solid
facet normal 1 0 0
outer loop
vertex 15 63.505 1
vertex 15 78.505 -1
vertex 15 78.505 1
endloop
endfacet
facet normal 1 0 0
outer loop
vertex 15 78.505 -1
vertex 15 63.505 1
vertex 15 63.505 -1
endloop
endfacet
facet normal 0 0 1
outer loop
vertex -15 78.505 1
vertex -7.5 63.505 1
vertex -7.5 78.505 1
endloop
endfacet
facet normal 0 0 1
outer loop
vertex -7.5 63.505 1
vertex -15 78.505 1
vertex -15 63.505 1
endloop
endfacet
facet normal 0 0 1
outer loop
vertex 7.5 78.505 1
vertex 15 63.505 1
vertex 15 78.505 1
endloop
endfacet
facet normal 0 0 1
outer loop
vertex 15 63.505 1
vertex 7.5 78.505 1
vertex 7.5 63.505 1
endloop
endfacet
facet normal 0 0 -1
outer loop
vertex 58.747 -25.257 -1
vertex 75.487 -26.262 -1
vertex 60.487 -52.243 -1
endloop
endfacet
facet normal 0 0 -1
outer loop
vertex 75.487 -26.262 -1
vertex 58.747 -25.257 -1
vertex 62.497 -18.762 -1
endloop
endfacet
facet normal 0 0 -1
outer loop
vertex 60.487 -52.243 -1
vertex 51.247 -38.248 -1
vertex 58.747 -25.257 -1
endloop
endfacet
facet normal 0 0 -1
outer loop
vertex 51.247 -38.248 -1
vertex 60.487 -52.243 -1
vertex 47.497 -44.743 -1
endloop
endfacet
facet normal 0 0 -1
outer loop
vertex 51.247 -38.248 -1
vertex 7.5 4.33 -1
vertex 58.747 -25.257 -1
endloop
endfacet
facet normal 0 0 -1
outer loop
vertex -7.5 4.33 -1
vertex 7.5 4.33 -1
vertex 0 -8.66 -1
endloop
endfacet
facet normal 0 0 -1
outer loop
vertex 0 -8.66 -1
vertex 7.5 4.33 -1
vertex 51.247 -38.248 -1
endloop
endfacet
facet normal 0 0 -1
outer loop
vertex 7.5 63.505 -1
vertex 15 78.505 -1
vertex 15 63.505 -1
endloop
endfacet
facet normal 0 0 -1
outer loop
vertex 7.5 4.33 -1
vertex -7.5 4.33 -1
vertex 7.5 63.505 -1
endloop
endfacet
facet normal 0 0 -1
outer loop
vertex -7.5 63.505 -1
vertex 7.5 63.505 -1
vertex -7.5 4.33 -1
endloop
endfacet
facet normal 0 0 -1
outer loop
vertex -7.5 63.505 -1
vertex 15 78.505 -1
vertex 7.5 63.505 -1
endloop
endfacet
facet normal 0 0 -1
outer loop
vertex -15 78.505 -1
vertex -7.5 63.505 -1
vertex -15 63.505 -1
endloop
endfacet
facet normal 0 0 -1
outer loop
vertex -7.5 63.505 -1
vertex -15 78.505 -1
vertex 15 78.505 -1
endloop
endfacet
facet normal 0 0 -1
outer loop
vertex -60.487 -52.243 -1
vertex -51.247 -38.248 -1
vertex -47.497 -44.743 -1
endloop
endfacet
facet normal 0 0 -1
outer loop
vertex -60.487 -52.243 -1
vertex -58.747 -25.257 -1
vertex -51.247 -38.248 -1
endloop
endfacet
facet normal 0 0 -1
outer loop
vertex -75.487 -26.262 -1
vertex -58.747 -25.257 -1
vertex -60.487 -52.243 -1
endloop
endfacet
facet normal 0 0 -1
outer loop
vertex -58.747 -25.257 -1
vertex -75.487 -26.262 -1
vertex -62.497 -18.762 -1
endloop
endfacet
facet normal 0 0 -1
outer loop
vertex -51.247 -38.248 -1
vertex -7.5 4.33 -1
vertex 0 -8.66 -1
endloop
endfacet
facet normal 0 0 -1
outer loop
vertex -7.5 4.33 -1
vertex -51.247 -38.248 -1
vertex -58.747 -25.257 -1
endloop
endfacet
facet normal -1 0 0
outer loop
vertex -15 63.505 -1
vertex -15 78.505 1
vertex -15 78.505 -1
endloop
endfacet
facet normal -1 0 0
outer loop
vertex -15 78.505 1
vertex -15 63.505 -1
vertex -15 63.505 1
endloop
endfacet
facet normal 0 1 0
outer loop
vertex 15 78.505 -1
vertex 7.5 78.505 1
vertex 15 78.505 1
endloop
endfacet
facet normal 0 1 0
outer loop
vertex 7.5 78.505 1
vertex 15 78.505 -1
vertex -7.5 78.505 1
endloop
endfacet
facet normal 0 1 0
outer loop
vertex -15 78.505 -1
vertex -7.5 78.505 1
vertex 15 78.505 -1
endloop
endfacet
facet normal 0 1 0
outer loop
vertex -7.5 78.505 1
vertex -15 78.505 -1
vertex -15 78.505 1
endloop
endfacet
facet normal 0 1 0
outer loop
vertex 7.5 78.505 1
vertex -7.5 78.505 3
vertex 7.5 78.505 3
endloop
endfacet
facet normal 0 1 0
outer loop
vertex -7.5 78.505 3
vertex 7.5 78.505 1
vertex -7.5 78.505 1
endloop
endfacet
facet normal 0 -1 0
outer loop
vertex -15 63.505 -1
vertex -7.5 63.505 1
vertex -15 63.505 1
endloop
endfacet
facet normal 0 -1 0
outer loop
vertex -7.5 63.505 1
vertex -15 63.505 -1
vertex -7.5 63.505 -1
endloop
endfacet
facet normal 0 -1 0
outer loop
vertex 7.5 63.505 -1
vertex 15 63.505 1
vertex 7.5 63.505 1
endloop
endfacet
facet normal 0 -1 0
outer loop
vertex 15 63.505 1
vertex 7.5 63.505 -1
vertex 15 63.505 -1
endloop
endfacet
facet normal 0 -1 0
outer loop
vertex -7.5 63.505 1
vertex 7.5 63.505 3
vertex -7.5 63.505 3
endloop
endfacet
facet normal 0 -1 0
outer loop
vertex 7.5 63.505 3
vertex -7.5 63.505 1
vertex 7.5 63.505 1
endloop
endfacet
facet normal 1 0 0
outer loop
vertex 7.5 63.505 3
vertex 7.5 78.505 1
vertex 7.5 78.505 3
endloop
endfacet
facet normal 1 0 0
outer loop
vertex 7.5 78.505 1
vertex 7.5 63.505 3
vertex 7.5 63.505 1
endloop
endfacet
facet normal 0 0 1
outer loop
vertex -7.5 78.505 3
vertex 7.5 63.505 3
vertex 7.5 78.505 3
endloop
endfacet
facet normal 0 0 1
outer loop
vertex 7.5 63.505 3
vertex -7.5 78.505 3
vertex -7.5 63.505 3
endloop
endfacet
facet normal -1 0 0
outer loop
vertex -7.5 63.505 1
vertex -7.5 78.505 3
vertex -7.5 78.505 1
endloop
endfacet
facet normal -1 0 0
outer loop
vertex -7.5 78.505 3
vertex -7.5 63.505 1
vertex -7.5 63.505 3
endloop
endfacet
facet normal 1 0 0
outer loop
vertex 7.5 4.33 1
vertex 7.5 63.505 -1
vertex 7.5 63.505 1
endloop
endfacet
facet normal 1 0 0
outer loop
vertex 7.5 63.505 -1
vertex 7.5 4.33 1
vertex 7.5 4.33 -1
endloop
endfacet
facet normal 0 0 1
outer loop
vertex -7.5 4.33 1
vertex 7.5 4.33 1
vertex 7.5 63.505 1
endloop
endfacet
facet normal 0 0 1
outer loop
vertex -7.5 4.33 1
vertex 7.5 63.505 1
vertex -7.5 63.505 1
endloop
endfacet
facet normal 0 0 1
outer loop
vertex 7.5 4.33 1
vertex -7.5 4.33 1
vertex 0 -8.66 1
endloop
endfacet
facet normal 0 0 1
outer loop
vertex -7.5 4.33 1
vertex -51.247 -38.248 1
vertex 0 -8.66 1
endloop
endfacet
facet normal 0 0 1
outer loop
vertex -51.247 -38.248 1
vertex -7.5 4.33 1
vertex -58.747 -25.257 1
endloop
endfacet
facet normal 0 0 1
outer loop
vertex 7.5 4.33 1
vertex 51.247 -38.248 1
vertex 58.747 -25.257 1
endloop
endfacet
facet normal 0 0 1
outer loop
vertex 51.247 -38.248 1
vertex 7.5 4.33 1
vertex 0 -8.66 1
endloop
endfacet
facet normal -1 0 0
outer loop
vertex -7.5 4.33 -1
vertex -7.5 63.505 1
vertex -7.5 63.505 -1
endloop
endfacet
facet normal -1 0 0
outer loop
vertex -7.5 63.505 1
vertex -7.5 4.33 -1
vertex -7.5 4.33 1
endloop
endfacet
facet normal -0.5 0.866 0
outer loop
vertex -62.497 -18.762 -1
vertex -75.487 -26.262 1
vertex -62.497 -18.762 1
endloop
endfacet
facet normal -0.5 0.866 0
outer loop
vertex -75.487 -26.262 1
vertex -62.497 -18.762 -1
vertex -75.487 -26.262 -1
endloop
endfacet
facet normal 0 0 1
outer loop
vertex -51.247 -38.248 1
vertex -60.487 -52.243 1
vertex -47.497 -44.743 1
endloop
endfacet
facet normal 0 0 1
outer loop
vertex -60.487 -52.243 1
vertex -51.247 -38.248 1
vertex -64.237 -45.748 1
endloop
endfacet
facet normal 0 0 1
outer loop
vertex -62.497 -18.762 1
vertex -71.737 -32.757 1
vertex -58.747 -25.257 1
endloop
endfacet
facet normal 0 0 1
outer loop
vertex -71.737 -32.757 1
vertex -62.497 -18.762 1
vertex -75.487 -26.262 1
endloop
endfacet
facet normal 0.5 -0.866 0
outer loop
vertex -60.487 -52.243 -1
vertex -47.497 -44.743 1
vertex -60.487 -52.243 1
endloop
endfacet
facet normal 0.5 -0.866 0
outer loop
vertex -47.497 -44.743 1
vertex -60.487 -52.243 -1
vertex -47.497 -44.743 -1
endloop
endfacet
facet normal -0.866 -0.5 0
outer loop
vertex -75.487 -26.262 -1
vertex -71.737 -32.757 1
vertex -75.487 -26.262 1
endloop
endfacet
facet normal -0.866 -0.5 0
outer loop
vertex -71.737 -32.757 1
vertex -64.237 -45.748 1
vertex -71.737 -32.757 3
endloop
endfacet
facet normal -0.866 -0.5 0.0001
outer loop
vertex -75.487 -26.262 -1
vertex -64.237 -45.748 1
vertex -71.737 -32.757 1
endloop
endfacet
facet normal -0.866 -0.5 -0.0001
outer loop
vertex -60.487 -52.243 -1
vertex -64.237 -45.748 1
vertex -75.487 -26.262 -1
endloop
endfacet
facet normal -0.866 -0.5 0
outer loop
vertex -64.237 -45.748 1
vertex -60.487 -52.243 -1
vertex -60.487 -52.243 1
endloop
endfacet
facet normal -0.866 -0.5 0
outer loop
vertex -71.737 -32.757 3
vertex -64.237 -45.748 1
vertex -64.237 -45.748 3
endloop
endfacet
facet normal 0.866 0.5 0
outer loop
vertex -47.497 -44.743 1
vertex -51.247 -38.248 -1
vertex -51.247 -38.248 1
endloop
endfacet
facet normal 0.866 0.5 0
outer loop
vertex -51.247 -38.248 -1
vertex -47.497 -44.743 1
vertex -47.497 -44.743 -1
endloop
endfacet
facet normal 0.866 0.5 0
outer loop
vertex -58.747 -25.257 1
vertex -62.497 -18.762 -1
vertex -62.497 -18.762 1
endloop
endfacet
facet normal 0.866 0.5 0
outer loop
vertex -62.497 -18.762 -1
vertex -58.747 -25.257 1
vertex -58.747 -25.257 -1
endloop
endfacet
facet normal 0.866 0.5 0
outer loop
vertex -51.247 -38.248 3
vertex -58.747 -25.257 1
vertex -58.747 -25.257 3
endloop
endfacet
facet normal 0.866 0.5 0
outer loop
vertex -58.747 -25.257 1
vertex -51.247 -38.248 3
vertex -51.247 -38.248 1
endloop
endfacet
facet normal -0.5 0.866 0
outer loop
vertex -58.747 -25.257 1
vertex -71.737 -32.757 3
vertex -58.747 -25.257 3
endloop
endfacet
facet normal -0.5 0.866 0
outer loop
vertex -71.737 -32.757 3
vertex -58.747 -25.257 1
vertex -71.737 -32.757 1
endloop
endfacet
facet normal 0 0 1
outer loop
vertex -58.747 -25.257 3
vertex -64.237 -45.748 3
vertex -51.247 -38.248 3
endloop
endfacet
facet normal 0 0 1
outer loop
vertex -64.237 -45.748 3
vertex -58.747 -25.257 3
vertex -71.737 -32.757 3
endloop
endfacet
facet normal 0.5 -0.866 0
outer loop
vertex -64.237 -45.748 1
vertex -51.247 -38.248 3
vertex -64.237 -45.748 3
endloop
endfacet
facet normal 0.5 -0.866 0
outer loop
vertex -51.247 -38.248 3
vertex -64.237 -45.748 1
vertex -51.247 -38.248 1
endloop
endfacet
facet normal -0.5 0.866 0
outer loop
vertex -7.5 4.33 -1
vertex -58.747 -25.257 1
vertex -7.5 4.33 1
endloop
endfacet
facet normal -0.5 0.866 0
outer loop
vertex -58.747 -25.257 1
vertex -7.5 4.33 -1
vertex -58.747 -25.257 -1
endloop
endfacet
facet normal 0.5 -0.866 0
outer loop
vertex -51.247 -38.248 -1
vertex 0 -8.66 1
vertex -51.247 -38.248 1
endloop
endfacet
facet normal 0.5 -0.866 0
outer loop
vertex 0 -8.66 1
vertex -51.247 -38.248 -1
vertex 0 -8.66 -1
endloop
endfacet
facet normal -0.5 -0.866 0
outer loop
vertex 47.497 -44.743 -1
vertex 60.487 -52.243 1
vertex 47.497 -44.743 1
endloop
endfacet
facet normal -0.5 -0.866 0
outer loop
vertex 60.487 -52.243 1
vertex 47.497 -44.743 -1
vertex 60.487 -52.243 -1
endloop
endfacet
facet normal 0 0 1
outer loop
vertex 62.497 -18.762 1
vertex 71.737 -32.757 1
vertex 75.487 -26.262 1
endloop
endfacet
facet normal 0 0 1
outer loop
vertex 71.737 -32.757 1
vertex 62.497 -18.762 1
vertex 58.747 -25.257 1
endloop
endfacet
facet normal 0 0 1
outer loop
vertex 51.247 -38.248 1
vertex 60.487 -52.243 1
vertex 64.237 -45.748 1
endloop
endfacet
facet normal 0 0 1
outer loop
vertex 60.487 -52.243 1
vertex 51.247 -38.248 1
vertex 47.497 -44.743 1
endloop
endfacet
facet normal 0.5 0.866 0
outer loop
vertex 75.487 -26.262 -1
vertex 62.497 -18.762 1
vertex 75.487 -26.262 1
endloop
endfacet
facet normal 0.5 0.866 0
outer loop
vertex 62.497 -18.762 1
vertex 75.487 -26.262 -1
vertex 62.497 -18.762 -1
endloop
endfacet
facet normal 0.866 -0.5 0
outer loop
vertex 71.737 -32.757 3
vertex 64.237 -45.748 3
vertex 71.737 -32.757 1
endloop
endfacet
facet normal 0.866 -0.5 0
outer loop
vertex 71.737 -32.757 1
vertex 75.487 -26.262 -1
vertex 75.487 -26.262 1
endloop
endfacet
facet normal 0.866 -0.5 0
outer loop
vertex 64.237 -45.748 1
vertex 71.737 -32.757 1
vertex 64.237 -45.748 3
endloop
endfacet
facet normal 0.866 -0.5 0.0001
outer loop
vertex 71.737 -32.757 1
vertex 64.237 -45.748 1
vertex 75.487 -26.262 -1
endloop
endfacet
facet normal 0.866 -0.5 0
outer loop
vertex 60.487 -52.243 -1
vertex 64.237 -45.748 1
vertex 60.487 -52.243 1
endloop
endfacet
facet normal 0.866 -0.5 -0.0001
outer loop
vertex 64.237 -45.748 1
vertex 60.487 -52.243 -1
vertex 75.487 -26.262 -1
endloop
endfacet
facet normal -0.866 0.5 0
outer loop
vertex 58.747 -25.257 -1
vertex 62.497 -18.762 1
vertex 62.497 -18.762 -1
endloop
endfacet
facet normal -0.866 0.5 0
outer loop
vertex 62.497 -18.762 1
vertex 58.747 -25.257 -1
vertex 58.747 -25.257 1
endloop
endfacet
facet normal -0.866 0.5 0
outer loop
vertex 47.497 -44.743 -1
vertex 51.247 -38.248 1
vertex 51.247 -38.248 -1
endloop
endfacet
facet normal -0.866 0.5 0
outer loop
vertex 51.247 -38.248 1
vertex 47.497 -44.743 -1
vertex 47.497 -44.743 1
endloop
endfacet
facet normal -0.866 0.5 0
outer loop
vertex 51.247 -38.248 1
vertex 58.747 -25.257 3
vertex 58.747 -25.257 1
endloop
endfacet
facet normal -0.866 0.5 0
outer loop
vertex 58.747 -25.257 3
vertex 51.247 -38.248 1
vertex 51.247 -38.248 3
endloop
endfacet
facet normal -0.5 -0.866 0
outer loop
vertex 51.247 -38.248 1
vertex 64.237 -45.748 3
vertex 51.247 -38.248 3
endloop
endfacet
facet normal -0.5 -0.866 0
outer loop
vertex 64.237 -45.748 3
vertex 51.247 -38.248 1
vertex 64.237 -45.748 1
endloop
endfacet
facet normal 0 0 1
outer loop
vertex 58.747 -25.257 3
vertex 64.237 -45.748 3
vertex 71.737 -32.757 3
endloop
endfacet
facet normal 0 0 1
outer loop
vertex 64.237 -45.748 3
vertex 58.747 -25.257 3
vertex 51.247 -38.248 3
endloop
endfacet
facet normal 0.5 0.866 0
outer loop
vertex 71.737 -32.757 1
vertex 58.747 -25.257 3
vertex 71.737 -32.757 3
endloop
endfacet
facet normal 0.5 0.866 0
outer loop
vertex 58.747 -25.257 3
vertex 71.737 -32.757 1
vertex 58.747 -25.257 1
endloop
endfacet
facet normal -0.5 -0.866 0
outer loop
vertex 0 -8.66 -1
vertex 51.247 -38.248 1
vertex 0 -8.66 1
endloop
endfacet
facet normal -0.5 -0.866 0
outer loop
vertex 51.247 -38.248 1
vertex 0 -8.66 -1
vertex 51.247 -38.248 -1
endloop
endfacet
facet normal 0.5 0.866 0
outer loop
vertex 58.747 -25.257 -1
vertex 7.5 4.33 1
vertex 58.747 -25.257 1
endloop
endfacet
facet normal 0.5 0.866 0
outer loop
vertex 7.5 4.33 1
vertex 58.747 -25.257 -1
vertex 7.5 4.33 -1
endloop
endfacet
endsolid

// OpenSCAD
w = 15;
l = 85;
l_d = l - w * cos(30) / 2;

union() {
	for (i = [0:2])
		rotate([0, 0, i * 120])
			union() {
				translate([0, l_d / 2, 0])
					cube([w, l_d, 2], center = true);
			
				translate([0, l_d - w/2, 0]) {
					cube([w * 2, w, 2], center = true);

					translate([0, 0, 1])
						cube([w, w, 4], center = true);
				}
			}
}
